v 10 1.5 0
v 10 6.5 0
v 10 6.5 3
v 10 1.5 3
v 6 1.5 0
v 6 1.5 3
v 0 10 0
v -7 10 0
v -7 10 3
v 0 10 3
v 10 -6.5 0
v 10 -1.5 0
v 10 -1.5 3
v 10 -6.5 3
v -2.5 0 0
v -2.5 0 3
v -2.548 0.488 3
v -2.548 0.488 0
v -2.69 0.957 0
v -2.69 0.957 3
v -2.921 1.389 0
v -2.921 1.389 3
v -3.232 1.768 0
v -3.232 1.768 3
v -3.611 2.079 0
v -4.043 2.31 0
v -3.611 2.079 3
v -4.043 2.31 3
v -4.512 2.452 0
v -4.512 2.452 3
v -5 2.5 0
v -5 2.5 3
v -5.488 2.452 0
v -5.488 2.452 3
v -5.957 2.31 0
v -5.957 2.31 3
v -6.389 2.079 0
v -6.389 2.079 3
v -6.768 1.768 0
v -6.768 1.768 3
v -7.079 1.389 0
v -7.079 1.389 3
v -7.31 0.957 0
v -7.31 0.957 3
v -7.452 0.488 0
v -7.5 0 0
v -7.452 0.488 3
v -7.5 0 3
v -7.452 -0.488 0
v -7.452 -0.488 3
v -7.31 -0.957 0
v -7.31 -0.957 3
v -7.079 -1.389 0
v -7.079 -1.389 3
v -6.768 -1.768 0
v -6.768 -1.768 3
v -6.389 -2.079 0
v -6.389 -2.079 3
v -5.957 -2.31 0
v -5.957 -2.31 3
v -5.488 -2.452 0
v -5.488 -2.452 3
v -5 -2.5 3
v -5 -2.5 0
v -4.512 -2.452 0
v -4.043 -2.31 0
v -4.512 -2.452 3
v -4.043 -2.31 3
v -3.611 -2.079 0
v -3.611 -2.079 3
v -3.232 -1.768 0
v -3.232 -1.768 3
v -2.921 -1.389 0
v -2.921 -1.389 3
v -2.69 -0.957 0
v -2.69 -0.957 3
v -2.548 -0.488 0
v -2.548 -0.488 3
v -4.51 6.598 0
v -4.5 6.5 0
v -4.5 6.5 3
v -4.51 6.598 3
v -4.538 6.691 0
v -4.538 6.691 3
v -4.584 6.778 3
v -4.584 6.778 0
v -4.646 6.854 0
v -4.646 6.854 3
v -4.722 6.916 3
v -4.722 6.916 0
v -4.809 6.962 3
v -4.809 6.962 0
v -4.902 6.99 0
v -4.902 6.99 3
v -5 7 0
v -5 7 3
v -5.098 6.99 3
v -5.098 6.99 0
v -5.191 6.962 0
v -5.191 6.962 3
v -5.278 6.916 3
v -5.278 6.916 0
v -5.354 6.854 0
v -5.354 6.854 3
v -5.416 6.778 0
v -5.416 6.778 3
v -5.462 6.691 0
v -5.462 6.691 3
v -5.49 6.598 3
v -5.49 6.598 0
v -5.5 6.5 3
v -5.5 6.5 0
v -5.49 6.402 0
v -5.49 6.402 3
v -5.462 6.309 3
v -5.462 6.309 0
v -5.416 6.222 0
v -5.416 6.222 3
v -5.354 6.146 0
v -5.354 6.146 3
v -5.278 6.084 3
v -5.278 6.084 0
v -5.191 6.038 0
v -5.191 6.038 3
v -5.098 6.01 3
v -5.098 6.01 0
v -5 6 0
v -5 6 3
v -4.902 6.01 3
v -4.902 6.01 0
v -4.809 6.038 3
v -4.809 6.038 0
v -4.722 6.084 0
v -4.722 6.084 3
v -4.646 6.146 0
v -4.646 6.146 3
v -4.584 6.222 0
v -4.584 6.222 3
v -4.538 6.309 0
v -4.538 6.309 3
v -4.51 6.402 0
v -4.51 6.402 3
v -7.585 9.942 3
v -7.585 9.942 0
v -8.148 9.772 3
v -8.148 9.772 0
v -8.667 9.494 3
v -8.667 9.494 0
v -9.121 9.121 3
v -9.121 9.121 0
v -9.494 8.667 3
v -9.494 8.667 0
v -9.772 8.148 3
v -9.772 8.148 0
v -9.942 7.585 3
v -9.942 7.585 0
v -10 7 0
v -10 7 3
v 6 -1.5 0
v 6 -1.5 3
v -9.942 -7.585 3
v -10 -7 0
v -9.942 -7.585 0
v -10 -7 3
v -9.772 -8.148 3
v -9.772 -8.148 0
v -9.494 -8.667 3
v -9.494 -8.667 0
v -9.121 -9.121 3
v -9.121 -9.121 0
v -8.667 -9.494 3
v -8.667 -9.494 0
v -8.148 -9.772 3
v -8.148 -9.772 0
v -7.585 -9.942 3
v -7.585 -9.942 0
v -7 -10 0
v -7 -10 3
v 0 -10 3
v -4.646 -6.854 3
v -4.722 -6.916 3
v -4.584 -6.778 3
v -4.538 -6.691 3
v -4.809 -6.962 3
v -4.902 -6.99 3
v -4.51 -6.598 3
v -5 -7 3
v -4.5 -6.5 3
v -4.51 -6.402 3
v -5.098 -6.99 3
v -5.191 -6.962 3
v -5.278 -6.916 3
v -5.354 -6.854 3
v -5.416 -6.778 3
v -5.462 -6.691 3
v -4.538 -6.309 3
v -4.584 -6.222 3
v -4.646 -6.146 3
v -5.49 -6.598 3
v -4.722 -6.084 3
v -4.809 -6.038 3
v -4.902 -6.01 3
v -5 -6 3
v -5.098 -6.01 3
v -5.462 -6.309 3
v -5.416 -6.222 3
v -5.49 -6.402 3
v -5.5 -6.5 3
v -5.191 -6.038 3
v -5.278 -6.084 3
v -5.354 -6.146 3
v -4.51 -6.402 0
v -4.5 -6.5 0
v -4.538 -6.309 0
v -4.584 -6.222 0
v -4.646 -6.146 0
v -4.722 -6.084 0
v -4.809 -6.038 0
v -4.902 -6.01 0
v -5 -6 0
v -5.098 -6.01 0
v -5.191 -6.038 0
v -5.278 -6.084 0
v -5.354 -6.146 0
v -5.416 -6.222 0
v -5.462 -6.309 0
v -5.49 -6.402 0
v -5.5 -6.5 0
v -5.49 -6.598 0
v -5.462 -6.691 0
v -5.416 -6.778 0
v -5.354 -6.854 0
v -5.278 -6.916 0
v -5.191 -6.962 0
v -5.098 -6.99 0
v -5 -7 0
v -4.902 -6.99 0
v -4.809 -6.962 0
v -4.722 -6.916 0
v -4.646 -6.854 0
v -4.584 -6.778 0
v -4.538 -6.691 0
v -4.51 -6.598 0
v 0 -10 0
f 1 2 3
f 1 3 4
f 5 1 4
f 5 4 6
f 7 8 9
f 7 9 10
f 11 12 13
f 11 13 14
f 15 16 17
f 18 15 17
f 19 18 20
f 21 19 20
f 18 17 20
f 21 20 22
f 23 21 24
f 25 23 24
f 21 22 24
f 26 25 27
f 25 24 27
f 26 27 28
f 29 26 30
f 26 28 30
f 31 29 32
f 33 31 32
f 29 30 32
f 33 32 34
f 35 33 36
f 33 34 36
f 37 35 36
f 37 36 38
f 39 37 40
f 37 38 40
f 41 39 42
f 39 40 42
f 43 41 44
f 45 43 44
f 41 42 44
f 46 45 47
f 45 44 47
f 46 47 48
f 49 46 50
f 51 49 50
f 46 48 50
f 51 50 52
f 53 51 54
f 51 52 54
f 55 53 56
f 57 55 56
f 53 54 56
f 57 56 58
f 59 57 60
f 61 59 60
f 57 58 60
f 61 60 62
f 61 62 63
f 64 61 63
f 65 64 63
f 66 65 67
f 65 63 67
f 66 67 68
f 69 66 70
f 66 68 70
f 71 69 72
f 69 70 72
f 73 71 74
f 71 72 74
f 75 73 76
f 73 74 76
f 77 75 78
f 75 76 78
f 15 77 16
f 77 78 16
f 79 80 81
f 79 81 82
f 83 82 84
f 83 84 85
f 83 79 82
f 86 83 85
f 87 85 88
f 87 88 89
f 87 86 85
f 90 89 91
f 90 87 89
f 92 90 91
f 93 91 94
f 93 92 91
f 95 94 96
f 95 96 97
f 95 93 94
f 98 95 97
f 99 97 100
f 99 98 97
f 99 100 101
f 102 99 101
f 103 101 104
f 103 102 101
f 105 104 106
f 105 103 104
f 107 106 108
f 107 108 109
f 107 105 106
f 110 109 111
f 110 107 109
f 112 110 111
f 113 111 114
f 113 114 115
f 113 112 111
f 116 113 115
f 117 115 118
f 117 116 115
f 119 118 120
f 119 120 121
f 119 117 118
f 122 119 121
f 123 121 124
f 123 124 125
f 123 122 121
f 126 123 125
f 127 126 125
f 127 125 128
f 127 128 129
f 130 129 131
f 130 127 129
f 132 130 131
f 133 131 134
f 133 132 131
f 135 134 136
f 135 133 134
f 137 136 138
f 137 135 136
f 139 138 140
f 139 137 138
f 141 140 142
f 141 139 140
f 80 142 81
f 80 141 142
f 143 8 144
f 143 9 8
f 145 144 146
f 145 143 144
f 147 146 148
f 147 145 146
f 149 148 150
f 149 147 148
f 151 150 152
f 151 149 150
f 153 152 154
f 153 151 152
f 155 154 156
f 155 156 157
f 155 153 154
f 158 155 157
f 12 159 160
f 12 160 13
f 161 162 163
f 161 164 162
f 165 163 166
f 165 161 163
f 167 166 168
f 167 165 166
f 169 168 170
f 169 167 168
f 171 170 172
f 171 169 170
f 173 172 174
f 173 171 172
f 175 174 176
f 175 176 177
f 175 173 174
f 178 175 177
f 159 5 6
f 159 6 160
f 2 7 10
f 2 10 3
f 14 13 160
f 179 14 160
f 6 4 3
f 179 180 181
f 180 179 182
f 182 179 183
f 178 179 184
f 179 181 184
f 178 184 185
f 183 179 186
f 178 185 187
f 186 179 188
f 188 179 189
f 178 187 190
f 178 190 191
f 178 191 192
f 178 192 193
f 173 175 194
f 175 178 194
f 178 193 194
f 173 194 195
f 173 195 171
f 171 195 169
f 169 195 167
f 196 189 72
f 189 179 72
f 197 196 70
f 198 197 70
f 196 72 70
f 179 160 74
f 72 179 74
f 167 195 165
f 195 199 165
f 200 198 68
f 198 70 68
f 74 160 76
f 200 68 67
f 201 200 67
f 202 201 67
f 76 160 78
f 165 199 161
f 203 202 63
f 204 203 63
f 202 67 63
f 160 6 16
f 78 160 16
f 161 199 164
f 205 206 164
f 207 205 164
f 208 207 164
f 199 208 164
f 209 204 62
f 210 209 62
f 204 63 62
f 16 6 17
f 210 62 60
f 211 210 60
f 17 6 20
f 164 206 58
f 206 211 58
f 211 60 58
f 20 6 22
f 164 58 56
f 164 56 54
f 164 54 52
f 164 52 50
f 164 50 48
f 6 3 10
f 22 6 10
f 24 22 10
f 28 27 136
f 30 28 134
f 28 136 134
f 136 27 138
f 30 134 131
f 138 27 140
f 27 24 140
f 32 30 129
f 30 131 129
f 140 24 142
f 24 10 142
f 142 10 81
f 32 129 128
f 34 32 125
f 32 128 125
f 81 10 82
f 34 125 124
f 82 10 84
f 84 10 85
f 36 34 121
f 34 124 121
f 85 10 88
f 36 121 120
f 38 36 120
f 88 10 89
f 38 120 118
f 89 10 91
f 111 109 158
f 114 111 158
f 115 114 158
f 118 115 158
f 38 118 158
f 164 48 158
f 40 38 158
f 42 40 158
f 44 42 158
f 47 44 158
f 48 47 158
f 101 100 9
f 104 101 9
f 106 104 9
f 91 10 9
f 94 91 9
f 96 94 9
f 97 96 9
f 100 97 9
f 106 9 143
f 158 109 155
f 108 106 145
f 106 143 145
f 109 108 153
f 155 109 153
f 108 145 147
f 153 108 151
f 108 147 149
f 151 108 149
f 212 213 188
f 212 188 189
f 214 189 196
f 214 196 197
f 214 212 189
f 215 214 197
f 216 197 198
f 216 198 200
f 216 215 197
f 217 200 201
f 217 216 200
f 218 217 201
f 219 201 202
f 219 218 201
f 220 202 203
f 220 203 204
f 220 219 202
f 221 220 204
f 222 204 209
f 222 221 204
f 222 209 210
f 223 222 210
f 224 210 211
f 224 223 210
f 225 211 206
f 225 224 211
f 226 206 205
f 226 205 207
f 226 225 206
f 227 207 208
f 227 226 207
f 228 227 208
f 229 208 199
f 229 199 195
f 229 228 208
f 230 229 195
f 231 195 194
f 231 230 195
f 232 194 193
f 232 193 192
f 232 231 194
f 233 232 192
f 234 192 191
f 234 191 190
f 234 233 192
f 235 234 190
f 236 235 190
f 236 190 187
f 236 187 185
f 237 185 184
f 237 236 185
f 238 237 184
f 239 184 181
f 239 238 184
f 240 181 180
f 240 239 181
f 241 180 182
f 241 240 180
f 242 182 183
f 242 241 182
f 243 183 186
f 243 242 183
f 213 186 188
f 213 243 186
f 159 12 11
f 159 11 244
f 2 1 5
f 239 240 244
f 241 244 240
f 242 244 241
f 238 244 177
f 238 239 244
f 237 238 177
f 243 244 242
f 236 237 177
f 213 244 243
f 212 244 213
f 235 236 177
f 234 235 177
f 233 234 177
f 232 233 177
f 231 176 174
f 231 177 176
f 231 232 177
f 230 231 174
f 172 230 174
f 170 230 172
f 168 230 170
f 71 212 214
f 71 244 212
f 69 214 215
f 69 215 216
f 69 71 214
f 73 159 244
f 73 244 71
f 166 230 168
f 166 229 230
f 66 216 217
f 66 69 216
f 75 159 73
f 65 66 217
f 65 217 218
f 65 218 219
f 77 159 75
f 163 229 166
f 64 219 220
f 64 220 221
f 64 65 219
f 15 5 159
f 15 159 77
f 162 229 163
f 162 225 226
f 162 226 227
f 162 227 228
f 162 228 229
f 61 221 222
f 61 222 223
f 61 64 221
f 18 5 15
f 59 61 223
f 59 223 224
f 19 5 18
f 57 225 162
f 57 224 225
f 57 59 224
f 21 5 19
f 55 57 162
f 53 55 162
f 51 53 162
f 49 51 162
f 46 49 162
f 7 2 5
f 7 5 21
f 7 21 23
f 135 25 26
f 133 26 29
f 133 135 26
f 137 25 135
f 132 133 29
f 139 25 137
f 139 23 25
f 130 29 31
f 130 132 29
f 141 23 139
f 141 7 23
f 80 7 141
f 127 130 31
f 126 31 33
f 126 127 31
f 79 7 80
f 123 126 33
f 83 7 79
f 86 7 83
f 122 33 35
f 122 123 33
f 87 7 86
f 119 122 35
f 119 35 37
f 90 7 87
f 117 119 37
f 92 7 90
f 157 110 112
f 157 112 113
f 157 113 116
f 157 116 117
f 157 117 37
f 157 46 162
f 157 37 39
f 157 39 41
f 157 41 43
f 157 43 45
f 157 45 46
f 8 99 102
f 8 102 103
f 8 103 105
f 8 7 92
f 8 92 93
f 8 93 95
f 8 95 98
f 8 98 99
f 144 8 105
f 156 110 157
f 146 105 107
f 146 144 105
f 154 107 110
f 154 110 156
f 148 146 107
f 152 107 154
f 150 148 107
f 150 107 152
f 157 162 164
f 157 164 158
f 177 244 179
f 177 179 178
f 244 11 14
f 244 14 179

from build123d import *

# Parameters (mm, degrees)
SKETCH1_R           = 0.5
BOSS_EXTRUDE1_DEPTH = 3
FILLET1_R           = 3
SKETCH2_R           = 2.5
CUT_EXTRUDE1_DEPTH  = 3


with BuildPart() as part:
    # Sketch1 → Boss-Extrude1 (new body)
    with BuildSketch(Plane.XY):
        Polygon((-10, 10), (0, 10), (10, 6.5), (10, 1.5), (6, 1.5), (6, -1.5), (10, -1.5), (10, -6.5), (0, -10), (-10, -10), align=None)
        with Locations((-5, 6.5)):
            Circle(SKETCH1_R, mode=Mode.SUBTRACT)
        with Locations((-5, -6.5)):
            Circle(SKETCH1_R, mode=Mode.SUBTRACT)
    extrude(amount=BOSS_EXTRUDE1_DEPTH)

    # Fillet1
    fillet1_edges = [part.edges().sort_by_distance(p)[0] for p in [
        (-10, 10, 1.5),
        (-10, -10, 1.5),
    ]]
    fillet(fillet1_edges, radius=FILLET1_R)

    # Sketch2 → Cut-Extrude1 (cut)
    with BuildSketch(Plane.XY.offset(3)):
        with Locations((-5, 0)):
            Circle(SKETCH2_R)
    extrude(amount=-CUT_EXTRUDE1_DEPTH, mode=Mode.SUBTRACT)


solid = part.part
